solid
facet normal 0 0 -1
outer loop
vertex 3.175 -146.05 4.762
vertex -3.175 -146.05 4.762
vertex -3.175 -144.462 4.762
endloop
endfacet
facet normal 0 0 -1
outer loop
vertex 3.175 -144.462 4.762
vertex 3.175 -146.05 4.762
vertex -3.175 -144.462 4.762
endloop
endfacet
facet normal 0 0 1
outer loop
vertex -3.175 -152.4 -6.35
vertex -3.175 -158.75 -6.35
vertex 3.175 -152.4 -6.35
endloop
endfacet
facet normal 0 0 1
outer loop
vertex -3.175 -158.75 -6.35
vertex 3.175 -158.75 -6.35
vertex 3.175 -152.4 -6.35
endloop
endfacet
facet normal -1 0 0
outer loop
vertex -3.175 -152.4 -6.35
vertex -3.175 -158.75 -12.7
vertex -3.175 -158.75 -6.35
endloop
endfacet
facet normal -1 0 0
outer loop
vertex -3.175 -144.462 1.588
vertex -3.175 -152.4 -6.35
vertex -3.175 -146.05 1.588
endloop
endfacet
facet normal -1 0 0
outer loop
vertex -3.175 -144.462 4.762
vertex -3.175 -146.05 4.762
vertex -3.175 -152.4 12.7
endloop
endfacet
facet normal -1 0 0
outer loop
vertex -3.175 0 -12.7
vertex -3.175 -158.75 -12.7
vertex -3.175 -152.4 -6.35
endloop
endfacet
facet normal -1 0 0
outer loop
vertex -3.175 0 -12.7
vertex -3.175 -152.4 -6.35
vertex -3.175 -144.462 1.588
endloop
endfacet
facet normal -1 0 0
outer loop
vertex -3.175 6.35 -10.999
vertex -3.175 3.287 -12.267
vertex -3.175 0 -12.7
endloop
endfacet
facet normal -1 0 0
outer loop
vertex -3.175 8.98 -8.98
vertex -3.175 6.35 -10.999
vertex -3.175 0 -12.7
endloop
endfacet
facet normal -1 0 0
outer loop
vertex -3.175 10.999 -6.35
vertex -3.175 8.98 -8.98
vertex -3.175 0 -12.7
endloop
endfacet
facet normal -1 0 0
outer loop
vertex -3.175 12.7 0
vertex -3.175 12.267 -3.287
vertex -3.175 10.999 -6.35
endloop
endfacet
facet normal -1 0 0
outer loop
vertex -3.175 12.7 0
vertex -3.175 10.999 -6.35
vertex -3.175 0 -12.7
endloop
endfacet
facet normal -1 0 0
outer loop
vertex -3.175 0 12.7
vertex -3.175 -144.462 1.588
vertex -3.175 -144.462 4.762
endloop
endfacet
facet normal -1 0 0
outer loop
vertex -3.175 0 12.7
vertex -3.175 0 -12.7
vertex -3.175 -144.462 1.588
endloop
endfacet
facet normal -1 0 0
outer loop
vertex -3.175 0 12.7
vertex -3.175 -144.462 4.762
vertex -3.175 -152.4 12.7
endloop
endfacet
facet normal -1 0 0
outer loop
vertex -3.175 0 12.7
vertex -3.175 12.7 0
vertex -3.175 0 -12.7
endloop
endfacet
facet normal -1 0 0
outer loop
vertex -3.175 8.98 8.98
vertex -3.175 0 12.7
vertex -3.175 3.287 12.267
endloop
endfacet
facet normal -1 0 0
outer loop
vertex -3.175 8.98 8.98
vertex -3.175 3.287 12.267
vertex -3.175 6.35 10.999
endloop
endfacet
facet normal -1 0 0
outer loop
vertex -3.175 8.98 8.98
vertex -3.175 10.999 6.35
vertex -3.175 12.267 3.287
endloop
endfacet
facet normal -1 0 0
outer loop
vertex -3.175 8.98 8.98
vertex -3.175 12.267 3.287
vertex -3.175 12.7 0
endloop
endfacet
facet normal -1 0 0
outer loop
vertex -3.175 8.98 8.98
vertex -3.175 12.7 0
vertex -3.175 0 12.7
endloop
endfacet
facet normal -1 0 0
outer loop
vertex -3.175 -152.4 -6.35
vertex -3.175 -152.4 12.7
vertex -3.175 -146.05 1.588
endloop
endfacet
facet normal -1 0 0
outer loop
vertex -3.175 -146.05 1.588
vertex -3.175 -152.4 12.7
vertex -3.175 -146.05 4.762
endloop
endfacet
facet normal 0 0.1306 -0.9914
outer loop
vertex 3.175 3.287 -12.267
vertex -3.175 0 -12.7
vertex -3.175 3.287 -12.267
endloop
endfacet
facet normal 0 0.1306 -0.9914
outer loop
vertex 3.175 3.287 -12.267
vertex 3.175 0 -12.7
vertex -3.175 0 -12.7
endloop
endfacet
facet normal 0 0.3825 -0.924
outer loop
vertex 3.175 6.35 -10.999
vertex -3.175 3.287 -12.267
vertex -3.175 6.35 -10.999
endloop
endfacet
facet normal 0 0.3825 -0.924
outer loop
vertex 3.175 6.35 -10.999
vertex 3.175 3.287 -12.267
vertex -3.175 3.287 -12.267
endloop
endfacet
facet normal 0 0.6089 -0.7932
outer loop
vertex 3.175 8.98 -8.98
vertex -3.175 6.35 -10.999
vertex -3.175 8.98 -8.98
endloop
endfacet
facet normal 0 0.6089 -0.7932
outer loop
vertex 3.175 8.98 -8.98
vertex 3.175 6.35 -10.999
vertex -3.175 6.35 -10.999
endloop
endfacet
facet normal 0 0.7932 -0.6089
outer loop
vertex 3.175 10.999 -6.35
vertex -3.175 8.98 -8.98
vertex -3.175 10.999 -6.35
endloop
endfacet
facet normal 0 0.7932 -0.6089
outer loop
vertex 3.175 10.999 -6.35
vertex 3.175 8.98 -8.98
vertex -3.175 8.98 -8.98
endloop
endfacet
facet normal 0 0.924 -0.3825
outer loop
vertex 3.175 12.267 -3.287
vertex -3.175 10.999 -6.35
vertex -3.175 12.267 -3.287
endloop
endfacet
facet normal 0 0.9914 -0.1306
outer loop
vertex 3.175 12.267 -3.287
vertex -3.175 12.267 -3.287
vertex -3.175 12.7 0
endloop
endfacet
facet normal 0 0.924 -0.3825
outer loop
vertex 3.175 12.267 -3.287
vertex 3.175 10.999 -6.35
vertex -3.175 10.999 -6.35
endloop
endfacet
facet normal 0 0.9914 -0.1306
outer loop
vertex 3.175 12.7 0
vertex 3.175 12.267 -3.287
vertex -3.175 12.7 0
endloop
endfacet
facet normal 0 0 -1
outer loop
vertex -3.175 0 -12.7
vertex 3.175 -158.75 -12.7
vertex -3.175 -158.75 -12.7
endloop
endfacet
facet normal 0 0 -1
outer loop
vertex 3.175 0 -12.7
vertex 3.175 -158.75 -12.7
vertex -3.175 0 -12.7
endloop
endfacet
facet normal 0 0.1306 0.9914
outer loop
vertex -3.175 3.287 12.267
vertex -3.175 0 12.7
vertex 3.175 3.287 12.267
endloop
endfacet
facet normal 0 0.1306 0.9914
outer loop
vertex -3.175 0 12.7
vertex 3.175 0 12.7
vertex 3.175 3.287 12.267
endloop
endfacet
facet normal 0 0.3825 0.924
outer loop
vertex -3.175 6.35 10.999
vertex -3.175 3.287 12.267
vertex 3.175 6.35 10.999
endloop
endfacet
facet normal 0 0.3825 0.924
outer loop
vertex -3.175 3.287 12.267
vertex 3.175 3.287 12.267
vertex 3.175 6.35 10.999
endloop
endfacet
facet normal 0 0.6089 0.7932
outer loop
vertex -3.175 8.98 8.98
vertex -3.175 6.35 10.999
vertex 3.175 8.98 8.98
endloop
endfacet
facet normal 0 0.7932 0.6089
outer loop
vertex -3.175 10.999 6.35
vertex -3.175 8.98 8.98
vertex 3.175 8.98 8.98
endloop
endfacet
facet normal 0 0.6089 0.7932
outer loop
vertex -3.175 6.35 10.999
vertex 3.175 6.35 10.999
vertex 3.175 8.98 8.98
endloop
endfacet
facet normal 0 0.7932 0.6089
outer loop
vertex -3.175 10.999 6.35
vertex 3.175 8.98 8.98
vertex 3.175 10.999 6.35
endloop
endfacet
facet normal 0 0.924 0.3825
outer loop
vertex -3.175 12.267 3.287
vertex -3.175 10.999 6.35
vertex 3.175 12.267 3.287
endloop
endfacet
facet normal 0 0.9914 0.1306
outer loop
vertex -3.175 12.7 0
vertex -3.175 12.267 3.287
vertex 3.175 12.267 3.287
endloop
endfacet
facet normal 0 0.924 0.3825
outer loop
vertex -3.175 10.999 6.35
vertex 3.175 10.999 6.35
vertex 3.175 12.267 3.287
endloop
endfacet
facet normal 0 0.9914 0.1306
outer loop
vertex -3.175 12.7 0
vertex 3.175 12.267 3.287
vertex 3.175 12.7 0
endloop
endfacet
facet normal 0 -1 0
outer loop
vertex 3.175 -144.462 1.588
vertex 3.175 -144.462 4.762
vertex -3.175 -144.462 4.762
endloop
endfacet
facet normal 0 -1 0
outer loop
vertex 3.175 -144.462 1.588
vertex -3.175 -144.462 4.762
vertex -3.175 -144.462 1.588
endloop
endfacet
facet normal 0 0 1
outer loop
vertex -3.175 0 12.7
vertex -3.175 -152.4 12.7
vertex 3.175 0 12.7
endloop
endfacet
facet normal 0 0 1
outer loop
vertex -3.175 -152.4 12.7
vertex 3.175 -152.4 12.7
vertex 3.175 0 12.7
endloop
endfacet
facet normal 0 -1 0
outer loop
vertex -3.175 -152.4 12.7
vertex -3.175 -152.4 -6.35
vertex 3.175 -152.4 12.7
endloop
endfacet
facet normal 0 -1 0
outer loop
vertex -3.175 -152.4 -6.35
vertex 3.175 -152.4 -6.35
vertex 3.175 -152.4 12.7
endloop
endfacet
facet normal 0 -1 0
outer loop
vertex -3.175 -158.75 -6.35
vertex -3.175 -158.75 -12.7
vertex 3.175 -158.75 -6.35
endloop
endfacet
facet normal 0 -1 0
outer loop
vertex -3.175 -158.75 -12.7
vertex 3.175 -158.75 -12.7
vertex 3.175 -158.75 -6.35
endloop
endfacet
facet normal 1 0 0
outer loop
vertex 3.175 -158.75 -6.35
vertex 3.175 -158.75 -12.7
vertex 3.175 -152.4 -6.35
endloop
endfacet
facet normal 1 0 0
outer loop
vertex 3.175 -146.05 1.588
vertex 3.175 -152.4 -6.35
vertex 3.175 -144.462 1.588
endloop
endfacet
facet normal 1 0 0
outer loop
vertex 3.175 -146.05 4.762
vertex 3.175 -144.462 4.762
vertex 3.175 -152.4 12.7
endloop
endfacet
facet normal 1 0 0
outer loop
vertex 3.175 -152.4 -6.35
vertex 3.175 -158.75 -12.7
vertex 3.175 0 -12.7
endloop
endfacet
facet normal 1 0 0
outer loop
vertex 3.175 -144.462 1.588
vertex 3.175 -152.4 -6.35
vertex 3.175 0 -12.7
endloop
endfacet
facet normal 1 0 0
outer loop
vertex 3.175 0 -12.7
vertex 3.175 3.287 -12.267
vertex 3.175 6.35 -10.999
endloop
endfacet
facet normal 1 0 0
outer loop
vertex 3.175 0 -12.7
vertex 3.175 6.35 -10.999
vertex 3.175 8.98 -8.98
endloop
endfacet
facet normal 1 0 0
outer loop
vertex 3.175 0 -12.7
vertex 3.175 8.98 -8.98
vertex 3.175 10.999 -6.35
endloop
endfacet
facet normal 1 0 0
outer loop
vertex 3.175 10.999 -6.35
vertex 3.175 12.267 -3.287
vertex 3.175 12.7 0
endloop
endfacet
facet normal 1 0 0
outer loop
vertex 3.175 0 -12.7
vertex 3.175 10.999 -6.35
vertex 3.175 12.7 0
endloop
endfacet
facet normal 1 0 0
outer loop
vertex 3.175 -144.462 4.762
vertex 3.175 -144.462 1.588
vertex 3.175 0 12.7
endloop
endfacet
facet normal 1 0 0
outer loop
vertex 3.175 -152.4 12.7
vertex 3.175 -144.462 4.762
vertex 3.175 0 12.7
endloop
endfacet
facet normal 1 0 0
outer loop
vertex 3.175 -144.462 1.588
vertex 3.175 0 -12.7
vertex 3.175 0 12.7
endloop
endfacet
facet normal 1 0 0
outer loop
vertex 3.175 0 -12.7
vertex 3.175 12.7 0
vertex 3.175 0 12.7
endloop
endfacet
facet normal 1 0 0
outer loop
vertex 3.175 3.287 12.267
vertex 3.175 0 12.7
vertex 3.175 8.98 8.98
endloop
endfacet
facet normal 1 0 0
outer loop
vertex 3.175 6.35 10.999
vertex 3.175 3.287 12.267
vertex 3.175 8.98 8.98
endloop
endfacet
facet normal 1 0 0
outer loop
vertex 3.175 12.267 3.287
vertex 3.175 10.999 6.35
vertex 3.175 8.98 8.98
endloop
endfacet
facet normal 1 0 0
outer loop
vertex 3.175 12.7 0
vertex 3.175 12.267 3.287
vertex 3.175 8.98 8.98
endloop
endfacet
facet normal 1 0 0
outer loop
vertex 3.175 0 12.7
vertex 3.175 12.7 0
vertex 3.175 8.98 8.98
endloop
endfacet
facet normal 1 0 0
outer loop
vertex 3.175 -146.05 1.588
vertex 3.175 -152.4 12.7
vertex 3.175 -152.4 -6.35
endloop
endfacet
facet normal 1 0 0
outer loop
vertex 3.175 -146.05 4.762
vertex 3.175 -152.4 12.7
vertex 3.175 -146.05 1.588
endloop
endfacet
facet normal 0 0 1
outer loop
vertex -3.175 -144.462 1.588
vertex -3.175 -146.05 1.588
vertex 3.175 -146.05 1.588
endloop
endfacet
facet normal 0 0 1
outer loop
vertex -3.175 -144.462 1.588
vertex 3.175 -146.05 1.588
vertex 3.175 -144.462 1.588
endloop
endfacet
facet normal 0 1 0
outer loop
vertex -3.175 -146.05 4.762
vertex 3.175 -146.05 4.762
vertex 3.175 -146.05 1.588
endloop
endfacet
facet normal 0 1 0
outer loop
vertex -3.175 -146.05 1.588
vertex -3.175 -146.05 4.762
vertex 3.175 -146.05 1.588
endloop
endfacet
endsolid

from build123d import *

# Parameters (mm, degrees)
BOSS_EXTRUDE1_DEPTH  = 3.175
FILLET1_R            = 12.7
SKETCH2_W            = 3.175
SKETCH2_H            = 1.5875
CABLE_TIE_HOLE_DEPTH = 160.383735055


with BuildPart() as part:
    # Sketch1 → Boss-Extrude1 (new, symmetric)
    with BuildSketch(Plane(origin=(0, 0, 0), x_dir=(0, 0, -1), z_dir=(1, 0, 0))):
        Polygon((12.7, -69.53755182), (12.7, -158.75), (6.35, -158.75), (6.35, -152.4), (-12.7, -152.4), (-12.7, 12.7), (12.7, 12.7), align=None)
    extrude(amount=BOSS_EXTRUDE1_DEPTH, both=True)

    # Fillet1
    fillet1_edges = [part.edges().sort_by_distance(p)[0] for p in [
        (0, 12.7, -12.7),
        (0, 12.7, 12.7),
    ]]
    fillet(fillet1_edges, radius=FILLET1_R - 0.0001)  # a hair under: the kernel refuses the full size

    # Sketch2 → Cable-tie hole (cut, through all)
    with BuildSketch(Plane(origin=(3.175, 0, 0), x_dir=(0, 0, -1), z_dir=(1, 0, 0))):
        with Locations((-3.175, -145.25625)):
            Rectangle(SKETCH2_W, SKETCH2_H)
    extrude(amount=-CABLE_TIE_HOLE_DEPTH, mode=Mode.SUBTRACT)


solid = part.part
